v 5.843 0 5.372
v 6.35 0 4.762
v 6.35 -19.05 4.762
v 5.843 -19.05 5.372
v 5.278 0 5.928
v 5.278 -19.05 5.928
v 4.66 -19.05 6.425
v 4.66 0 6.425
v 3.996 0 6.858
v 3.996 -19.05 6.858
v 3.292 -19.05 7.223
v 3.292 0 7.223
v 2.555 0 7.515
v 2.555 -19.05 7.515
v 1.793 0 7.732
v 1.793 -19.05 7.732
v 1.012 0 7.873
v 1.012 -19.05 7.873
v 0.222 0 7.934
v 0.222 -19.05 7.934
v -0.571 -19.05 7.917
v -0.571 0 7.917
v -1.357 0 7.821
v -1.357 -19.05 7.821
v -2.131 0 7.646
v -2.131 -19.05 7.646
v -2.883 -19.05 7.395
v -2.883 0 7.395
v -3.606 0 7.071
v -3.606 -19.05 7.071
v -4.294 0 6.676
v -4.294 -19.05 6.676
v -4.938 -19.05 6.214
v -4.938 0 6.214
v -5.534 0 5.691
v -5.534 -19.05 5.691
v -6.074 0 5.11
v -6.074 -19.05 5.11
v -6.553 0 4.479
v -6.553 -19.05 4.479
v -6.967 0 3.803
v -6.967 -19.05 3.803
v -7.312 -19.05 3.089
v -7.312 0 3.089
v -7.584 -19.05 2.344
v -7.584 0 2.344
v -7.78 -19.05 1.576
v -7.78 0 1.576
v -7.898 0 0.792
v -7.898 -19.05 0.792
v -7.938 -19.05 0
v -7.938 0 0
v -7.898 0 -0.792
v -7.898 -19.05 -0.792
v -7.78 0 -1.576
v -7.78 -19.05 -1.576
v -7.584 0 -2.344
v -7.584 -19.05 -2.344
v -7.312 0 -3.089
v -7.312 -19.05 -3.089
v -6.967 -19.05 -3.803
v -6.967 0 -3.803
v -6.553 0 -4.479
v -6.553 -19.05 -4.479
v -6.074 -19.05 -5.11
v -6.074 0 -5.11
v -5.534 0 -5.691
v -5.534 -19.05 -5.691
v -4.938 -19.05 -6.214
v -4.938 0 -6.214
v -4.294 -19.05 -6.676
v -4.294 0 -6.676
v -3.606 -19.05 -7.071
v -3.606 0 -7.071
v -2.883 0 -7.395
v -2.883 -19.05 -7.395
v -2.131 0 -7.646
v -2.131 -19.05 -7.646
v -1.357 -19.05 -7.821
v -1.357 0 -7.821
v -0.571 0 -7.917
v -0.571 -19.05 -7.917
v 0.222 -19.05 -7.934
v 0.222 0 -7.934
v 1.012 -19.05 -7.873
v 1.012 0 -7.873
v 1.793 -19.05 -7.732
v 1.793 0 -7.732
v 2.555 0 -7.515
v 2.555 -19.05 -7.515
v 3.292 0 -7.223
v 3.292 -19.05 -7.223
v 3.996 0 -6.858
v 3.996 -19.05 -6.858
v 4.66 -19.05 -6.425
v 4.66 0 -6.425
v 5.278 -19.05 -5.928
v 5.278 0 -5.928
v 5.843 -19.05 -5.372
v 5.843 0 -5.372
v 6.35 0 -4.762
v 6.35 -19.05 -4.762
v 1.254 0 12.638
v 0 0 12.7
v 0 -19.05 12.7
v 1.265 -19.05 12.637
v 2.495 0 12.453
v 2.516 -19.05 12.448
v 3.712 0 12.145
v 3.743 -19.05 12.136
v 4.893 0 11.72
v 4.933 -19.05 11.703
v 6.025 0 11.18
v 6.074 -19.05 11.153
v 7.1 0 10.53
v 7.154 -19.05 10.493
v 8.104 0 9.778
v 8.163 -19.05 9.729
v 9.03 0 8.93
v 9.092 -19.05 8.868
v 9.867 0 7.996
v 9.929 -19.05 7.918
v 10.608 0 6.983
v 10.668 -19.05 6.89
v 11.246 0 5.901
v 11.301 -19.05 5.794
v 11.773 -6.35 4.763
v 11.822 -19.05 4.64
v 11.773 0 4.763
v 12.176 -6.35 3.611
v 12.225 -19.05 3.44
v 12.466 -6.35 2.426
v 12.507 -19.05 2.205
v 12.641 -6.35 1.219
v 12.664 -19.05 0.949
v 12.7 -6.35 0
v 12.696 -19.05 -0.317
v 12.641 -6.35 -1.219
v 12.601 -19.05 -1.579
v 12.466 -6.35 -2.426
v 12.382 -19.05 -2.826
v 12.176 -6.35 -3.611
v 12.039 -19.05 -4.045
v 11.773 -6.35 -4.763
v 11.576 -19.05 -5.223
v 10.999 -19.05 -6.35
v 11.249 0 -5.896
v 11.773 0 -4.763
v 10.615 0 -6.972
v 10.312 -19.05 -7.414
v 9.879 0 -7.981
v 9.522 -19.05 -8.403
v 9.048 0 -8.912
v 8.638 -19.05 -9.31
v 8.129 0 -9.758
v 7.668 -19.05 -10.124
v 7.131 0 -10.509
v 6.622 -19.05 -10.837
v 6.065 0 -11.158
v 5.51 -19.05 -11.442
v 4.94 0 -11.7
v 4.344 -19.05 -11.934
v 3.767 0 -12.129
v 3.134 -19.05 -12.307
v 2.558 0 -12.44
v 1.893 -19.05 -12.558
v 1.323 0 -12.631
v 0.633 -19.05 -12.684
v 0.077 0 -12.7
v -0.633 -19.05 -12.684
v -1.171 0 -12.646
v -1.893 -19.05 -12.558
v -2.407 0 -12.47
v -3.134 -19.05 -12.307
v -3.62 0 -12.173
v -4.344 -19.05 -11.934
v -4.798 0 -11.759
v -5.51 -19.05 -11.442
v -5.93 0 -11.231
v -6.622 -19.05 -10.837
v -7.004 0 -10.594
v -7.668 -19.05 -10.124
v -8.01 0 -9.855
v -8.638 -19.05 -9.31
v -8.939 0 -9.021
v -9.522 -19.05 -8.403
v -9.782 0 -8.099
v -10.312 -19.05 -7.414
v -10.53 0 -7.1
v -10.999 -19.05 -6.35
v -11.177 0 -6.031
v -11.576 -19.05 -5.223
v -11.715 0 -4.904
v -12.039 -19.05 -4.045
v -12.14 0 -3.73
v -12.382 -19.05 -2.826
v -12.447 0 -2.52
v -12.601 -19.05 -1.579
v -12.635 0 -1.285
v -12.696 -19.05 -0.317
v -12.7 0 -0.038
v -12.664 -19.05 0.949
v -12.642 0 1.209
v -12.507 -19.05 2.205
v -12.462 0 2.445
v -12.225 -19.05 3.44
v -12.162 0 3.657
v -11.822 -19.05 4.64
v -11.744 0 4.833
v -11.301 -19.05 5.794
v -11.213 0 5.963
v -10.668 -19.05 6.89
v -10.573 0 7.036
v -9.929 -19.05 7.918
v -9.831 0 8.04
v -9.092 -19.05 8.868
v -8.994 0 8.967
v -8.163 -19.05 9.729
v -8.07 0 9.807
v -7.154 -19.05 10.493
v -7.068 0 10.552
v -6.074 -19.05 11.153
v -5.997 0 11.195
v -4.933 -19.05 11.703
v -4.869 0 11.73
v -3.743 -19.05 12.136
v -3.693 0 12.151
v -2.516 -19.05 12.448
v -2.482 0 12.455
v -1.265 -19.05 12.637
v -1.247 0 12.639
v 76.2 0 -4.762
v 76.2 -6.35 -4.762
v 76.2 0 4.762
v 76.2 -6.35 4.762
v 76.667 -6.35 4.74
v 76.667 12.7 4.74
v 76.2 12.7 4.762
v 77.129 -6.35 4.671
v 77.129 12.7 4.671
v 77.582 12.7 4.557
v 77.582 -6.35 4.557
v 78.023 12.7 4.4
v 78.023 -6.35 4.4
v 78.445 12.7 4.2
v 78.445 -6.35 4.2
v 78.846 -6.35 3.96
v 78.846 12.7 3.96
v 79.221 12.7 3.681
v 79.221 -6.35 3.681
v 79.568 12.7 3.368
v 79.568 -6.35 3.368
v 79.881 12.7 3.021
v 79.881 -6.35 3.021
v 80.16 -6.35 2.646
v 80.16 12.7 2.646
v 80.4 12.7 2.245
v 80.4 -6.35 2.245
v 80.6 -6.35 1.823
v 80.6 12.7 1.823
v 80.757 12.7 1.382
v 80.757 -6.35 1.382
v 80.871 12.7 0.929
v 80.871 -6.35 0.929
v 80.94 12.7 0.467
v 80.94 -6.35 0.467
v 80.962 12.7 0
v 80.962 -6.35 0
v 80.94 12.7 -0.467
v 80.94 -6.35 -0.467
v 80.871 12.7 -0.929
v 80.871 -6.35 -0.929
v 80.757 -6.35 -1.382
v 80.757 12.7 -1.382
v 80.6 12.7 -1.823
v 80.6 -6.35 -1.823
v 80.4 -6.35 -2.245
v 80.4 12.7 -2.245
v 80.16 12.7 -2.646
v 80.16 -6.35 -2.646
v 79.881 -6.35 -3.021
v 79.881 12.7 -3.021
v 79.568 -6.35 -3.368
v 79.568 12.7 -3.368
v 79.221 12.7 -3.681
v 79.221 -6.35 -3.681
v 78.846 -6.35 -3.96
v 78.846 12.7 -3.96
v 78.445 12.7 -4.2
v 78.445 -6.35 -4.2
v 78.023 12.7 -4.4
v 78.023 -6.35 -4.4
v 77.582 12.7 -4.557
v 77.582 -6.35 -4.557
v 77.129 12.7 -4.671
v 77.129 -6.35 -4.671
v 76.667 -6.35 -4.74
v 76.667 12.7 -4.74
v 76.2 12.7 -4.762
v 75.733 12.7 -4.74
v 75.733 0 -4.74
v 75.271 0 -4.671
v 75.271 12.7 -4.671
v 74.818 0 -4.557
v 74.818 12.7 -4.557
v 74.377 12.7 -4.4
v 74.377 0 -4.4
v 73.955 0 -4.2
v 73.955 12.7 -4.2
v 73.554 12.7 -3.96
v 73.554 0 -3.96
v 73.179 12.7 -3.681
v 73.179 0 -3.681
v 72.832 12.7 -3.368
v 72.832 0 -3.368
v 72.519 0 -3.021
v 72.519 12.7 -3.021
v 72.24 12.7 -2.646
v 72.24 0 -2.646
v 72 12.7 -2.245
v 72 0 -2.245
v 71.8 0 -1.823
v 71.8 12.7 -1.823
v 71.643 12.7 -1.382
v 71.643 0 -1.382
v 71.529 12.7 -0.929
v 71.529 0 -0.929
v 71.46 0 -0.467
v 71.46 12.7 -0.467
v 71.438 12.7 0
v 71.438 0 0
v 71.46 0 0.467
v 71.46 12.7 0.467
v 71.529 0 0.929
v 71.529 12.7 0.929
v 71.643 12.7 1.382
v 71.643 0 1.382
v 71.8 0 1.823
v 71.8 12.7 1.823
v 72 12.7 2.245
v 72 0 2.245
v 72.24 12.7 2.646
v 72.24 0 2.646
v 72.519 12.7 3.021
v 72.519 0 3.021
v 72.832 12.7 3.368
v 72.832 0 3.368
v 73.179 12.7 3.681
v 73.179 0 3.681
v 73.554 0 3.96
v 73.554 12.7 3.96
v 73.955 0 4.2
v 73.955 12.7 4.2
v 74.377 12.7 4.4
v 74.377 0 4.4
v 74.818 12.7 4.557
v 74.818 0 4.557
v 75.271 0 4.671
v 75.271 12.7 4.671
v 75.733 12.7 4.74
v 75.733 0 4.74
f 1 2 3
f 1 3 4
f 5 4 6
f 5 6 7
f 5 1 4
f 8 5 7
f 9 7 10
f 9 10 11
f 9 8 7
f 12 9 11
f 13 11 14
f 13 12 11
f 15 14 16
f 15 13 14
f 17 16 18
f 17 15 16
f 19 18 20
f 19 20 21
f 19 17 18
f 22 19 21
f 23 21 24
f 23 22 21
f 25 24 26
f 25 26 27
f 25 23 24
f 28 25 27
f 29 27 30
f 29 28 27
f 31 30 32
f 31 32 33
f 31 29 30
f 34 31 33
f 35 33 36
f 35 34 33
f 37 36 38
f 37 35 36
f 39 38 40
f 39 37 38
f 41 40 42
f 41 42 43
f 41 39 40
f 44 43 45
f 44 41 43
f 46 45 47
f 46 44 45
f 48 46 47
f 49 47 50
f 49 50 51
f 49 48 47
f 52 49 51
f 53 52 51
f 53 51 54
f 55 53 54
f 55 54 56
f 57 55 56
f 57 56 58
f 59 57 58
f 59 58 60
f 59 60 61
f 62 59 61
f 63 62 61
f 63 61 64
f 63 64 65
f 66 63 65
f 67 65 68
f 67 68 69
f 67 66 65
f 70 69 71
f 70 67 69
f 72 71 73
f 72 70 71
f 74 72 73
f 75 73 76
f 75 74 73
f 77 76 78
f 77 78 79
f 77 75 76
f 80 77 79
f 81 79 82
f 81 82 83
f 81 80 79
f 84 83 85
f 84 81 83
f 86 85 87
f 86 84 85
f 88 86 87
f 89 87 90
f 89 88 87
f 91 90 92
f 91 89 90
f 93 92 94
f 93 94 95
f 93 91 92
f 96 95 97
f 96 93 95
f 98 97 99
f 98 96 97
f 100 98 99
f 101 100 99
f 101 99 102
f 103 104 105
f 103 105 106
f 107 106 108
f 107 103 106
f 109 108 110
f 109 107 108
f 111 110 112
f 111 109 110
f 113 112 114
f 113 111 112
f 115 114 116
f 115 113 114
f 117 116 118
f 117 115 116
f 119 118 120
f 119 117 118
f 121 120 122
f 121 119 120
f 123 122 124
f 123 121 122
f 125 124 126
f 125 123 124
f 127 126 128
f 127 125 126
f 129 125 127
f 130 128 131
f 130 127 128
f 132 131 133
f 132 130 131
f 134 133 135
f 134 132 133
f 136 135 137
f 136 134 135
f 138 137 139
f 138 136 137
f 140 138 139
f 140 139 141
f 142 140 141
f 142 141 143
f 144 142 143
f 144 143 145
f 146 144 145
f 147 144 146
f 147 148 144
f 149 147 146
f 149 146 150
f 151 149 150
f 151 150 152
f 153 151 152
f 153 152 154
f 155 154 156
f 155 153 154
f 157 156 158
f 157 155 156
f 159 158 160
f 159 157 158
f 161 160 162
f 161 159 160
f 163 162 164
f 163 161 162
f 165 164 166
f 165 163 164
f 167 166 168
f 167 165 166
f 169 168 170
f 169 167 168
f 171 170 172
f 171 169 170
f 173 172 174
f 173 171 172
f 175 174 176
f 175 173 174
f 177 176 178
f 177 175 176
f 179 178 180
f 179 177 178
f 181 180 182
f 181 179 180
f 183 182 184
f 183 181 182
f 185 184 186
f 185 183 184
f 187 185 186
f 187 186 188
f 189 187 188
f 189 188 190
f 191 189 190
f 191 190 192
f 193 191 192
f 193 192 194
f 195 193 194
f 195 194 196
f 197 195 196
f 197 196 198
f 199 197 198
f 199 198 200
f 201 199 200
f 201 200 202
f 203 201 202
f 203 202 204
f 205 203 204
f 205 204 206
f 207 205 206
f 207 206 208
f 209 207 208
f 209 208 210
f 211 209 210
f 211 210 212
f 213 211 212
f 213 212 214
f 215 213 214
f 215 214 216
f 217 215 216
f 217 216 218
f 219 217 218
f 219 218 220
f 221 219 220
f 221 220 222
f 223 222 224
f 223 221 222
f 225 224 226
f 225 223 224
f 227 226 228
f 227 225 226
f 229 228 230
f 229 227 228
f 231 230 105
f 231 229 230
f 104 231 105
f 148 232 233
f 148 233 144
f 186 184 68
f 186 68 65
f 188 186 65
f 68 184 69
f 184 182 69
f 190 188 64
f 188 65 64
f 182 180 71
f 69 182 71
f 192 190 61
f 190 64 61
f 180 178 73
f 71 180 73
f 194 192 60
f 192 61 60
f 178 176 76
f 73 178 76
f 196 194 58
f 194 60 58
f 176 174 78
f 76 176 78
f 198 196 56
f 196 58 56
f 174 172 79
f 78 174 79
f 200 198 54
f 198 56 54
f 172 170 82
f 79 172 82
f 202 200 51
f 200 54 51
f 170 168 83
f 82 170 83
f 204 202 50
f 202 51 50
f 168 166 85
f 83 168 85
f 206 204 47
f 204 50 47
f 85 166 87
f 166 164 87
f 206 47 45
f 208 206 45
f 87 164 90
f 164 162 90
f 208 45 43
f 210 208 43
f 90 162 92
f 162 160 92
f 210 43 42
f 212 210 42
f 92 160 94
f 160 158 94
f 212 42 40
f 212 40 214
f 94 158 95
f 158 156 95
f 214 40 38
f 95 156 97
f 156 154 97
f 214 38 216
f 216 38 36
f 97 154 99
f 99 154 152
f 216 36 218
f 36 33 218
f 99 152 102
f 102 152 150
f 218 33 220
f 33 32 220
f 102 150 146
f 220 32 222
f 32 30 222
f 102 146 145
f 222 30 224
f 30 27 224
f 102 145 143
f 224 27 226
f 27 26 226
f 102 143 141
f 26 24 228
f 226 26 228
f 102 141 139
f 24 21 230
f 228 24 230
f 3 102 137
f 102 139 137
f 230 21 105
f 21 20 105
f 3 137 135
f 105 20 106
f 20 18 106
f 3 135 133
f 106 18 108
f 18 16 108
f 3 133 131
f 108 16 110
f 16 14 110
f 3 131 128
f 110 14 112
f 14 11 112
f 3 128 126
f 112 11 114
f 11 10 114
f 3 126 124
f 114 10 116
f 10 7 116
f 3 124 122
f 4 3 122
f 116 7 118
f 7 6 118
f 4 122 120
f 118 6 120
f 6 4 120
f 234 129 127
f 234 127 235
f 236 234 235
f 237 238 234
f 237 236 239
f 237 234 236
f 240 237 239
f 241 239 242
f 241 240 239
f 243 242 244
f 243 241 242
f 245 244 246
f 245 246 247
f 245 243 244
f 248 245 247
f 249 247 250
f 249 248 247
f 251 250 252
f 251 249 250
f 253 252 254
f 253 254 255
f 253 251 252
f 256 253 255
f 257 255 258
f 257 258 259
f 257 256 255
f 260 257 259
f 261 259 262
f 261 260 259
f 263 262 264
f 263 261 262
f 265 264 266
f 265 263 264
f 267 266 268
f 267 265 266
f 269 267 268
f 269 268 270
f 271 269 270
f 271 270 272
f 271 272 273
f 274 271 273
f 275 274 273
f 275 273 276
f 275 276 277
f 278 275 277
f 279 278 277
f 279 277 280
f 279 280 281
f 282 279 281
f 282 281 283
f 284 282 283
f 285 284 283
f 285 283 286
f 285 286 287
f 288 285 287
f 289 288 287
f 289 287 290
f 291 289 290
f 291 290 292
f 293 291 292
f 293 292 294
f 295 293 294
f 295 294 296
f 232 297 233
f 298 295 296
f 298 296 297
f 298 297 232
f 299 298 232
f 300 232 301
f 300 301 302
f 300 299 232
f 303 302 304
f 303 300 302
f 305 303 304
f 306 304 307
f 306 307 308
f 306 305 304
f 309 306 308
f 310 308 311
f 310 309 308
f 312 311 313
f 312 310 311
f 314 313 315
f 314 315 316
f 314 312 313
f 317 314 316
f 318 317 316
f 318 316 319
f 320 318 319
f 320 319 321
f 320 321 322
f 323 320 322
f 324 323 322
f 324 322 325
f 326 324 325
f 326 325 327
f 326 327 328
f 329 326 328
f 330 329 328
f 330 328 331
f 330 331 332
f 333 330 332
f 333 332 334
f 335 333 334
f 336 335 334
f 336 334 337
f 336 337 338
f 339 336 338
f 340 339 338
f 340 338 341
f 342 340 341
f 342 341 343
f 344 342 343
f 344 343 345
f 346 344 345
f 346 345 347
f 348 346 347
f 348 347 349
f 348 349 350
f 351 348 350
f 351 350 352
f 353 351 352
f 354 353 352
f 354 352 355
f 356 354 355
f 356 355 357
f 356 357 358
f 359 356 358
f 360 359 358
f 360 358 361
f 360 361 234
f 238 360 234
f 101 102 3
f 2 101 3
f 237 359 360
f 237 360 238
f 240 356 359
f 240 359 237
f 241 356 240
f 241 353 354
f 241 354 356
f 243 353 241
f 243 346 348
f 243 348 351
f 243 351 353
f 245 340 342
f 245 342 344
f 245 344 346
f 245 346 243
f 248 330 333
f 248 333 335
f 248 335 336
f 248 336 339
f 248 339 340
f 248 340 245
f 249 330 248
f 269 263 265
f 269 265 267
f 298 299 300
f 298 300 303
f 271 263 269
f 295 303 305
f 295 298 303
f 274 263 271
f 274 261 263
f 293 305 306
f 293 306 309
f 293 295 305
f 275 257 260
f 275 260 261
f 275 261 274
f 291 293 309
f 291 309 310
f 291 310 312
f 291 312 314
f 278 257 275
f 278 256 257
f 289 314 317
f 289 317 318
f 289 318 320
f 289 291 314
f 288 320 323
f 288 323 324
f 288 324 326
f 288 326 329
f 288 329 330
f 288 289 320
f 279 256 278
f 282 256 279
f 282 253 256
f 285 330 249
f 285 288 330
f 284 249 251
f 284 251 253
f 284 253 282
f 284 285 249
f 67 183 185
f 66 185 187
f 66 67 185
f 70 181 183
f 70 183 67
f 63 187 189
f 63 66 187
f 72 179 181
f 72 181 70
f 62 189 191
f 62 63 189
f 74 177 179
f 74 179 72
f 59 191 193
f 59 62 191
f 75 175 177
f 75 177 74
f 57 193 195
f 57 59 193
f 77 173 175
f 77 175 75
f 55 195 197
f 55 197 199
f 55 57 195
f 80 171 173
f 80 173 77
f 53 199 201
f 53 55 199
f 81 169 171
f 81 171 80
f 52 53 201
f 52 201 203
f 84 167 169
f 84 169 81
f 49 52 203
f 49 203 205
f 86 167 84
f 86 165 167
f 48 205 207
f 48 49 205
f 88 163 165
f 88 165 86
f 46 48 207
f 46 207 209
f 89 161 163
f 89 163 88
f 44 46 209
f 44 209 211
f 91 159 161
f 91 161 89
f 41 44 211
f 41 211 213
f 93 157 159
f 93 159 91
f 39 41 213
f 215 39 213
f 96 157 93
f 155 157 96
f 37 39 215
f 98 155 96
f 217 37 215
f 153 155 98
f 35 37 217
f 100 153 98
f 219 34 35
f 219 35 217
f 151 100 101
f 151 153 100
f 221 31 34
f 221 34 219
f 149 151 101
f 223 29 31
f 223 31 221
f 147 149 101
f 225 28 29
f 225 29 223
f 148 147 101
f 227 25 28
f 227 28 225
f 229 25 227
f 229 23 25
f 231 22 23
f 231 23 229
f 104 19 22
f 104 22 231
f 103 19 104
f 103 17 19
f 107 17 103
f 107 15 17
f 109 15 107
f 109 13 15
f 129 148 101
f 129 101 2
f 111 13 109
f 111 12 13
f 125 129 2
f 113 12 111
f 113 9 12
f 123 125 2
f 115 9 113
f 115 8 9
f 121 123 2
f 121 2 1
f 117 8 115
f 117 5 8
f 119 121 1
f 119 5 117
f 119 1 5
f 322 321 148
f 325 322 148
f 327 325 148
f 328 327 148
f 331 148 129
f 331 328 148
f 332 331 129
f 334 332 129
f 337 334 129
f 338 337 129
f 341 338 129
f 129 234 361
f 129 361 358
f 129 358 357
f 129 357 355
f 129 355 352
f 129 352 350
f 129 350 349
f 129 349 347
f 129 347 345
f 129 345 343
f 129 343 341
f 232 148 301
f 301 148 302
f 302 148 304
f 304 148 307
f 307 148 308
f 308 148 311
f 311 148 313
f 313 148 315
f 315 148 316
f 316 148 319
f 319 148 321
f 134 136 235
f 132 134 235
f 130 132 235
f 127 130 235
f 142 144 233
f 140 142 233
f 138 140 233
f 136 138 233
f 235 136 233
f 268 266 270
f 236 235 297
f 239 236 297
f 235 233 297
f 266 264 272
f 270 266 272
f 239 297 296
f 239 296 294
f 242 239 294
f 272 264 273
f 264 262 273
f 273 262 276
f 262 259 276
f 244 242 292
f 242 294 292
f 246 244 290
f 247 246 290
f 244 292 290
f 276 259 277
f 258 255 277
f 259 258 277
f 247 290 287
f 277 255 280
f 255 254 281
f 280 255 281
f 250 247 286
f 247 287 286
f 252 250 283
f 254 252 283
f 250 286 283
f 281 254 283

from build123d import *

# Parameters (mm, degrees)
BOSS_EXTRUDE1_DEPTH = 6.35
SKETCH1_3_R         = 12.7
BOSS_EXTRUDE2_DEPTH = 19.05
BOSS_EXTRUDE3_START = 12.7
SKETCH1_4_R         = 4.7625
BOSS_EXTRUDE3_DEPTH = 12.7


with BuildPart() as part:
    # Sketch1 → Boss-Extrude1 (new body)
    with BuildSketch(Plane(origin=(0, 0, 0), x_dir=(1, 0, 0), z_dir=(0, 1, 0))):
        with BuildLine():
            Line((76.2, 4.7625), (11.773215098, 4.7625))
            ThreePointArc((11.773215098, 4.7625), (12.7, 0), (11.773215098, -4.7625))
            Line((11.773215098, -4.7625), (76.2, -4.7625))
            ThreePointArc((76.2, -4.7625), (80.9625, 0), (76.2, 4.7625))
        make_face()
    extrude(amount=-BOSS_EXTRUDE1_DEPTH)

    # Sketch1<3> → Boss-Extrude2 (add)
    with BuildSketch(Plane(origin=(0, 0, 0), x_dir=(1, 0, 0), z_dir=(0, 1, 0))):
        Circle(SKETCH1_3_R)
        with BuildLine():
            ThreePointArc((6.35, -4.7625), (-7.9375, 0), (6.35, 4.7625))
            Line((6.35, 4.7625), (6.35, -4.7625))
        make_face(mode=Mode.SUBTRACT)
    extrude(amount=-BOSS_EXTRUDE2_DEPTH)

    # Sketch1<4> → Boss-Extrude3 (add)
    with BuildSketch(Plane(origin=(0, 0, 0), x_dir=(1, 0, 0), z_dir=(0, 1, 0)).offset(BOSS_EXTRUDE3_START)):
        with Locations((76.2, 0)):
            Circle(SKETCH1_4_R)
    extrude(amount=-BOSS_EXTRUDE3_DEPTH)


solid = part.part
